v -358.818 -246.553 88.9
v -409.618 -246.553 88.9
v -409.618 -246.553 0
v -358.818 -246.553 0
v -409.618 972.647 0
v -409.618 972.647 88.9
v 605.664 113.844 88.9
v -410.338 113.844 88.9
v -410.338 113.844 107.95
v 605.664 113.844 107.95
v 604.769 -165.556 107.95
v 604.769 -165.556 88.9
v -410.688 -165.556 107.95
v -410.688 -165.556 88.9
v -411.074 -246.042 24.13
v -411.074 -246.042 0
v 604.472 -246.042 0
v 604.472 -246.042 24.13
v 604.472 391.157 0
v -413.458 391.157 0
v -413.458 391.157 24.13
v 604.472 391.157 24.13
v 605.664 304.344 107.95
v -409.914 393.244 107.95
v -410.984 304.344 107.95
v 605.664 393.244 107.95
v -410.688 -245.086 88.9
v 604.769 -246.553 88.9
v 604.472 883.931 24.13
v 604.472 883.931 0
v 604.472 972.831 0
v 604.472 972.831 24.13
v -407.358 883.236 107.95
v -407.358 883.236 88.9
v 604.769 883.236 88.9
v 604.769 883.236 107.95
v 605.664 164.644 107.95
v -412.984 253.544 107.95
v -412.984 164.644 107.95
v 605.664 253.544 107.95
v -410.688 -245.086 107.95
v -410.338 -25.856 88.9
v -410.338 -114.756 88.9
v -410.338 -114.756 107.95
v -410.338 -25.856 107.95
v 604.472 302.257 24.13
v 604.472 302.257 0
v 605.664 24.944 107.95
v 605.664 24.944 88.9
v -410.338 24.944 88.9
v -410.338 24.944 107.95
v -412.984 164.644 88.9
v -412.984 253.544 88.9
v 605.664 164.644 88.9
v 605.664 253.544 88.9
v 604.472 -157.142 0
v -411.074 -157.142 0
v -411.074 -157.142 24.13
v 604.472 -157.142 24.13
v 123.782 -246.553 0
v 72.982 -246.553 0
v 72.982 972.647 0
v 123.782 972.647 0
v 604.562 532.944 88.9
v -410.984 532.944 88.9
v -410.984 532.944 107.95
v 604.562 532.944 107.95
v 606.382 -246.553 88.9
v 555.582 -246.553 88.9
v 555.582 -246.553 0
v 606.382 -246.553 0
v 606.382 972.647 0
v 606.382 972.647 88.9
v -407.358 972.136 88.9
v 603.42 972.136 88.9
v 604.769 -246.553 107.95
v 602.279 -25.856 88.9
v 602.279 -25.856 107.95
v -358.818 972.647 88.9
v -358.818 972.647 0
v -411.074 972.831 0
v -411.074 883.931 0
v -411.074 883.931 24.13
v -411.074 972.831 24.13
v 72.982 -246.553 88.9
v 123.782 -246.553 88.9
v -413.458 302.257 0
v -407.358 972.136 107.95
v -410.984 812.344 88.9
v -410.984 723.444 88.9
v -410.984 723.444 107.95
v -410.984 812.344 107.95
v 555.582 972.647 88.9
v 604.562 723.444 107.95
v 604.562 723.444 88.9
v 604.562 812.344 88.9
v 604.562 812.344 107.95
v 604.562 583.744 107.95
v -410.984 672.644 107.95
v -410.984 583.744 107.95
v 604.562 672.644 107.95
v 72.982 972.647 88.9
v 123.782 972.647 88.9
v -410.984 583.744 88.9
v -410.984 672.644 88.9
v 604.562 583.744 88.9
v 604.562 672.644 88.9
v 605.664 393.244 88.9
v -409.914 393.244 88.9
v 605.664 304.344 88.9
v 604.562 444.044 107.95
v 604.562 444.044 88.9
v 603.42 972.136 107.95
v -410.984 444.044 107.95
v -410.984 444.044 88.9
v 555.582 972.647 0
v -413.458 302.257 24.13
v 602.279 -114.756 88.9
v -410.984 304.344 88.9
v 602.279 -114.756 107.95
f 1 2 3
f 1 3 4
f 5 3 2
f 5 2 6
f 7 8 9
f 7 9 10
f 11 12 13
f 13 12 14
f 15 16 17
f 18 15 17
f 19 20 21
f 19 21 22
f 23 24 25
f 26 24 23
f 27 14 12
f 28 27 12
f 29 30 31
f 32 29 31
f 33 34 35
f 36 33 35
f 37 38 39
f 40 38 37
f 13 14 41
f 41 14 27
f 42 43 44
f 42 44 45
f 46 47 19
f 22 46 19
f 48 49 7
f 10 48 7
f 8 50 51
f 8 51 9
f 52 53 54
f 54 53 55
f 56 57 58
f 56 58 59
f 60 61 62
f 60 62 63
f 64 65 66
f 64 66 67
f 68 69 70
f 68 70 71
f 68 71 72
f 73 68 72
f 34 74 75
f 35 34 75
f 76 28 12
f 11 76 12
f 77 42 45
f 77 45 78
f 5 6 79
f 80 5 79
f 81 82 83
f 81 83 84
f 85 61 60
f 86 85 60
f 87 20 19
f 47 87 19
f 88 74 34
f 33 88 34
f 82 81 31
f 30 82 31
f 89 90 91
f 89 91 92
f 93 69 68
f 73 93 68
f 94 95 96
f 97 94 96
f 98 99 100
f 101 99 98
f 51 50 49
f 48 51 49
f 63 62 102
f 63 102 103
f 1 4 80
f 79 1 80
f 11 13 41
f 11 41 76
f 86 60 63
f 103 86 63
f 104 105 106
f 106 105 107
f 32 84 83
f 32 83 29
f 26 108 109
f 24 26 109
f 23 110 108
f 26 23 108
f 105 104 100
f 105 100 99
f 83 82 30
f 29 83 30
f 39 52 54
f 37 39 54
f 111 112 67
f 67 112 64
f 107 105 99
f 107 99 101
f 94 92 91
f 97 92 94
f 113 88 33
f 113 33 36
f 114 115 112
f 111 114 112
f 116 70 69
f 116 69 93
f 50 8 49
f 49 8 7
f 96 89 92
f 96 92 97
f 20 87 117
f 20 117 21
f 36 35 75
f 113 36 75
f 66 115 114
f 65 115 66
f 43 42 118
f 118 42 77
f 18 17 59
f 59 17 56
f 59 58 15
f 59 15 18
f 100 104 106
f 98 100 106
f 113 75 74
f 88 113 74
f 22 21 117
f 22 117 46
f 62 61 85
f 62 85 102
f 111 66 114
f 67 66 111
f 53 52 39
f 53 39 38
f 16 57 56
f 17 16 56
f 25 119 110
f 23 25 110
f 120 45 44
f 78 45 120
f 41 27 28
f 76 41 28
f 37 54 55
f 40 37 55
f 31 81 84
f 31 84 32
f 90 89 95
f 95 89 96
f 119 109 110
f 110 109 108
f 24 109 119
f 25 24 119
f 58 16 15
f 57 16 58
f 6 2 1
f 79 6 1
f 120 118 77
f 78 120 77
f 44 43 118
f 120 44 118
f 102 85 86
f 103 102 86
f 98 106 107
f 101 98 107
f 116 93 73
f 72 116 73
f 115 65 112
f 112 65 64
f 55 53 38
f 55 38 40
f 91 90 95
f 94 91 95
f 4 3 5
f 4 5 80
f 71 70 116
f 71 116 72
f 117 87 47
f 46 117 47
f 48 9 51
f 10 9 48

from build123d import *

# Parameters (mm, degrees)
F0_W     = 50.8
F0_H     = 1219.2
F1_DEPTH = 88.9
F2_W     = 1015.545875
F2_H     = 88.9
F2_W_2   = 1018.648714
F2_W_3   = 1016.00194
F2_W_4   = 1012.616396
F3_DEPTH = 19.05
F4_W     = 1015.545935
F4_H     = 88.9
F4_W_2   = 1017.929852
F5_DEPTH = 24.13


with BuildPart() as f1:
    # F0 (on Top) → F1 (new body)
    with BuildSketch(Plane.XY):
        with Locations((-384.217659, 363.047006)):
            Rectangle(F0_W, F0_H)
        with Locations((98.382341, 363.047006)):
            Rectangle(F0_W, F0_H)
        with Locations((580.982341, 363.047006)):
            Rectangle(F0_W, F0_H)
    extrude(amount=F1_DEPTH)


with BuildPart() as f3:
    # F2 (on face) → F3 (new body)
    with BuildSketch(Plane.XY.offset(88.9)):
        with Locations((96.78875, 767.893939)):
            Rectangle(F2_W, F2_H)
        with Locations((96.78875, 628.193939)):
            Rectangle(F2_W, F2_H)
        with Locations((96.78875, 488.493939)):
            Rectangle(F2_W, F2_H)
        Polygon((605.664253, 393.243939), (-409.914374, 393.243939), (-410.984188, 304.343939), (605.664253, 304.343939), align=None)
        with Locations((96.339896, 209.093939)):
            Rectangle(F2_W_2, F2_H)
        with Locations((97.663283, 69.393939)):
            Rectangle(F2_W_3, F2_H)
        with Locations((95.970511, -70.306061)):
            Rectangle(F2_W_4, F2_H)
        Polygon((-410.687506, -165.556061), (-410.687506, -245.086014), (604.76917, -246.552994), (604.76917, -165.556061), align=None)
        Polygon((604.528725, 883.23614), (604.76917, 883.23614), (603.41996, 972.13614), (-407.35814, 972.13614), (-407.35814, 883.23614), align=None)
    extrude(amount=F3_DEPTH)


with BuildPart() as f5:
    # F4 (on Top) → F5 (new body)
    with BuildSketch(Plane.XY):
        with Locations((96.698954, -201.592132)):
            Rectangle(F4_W, F4_H)
        with Locations((95.506996, 346.707299)):
            Rectangle(F4_W_2, F4_H)
        with Locations((96.698954, 928.381458)):
            Rectangle(F4_W, F4_H)
    extrude(amount=F5_DEPTH)


solid = Compound([f1.part, f3.part, f5.part])
